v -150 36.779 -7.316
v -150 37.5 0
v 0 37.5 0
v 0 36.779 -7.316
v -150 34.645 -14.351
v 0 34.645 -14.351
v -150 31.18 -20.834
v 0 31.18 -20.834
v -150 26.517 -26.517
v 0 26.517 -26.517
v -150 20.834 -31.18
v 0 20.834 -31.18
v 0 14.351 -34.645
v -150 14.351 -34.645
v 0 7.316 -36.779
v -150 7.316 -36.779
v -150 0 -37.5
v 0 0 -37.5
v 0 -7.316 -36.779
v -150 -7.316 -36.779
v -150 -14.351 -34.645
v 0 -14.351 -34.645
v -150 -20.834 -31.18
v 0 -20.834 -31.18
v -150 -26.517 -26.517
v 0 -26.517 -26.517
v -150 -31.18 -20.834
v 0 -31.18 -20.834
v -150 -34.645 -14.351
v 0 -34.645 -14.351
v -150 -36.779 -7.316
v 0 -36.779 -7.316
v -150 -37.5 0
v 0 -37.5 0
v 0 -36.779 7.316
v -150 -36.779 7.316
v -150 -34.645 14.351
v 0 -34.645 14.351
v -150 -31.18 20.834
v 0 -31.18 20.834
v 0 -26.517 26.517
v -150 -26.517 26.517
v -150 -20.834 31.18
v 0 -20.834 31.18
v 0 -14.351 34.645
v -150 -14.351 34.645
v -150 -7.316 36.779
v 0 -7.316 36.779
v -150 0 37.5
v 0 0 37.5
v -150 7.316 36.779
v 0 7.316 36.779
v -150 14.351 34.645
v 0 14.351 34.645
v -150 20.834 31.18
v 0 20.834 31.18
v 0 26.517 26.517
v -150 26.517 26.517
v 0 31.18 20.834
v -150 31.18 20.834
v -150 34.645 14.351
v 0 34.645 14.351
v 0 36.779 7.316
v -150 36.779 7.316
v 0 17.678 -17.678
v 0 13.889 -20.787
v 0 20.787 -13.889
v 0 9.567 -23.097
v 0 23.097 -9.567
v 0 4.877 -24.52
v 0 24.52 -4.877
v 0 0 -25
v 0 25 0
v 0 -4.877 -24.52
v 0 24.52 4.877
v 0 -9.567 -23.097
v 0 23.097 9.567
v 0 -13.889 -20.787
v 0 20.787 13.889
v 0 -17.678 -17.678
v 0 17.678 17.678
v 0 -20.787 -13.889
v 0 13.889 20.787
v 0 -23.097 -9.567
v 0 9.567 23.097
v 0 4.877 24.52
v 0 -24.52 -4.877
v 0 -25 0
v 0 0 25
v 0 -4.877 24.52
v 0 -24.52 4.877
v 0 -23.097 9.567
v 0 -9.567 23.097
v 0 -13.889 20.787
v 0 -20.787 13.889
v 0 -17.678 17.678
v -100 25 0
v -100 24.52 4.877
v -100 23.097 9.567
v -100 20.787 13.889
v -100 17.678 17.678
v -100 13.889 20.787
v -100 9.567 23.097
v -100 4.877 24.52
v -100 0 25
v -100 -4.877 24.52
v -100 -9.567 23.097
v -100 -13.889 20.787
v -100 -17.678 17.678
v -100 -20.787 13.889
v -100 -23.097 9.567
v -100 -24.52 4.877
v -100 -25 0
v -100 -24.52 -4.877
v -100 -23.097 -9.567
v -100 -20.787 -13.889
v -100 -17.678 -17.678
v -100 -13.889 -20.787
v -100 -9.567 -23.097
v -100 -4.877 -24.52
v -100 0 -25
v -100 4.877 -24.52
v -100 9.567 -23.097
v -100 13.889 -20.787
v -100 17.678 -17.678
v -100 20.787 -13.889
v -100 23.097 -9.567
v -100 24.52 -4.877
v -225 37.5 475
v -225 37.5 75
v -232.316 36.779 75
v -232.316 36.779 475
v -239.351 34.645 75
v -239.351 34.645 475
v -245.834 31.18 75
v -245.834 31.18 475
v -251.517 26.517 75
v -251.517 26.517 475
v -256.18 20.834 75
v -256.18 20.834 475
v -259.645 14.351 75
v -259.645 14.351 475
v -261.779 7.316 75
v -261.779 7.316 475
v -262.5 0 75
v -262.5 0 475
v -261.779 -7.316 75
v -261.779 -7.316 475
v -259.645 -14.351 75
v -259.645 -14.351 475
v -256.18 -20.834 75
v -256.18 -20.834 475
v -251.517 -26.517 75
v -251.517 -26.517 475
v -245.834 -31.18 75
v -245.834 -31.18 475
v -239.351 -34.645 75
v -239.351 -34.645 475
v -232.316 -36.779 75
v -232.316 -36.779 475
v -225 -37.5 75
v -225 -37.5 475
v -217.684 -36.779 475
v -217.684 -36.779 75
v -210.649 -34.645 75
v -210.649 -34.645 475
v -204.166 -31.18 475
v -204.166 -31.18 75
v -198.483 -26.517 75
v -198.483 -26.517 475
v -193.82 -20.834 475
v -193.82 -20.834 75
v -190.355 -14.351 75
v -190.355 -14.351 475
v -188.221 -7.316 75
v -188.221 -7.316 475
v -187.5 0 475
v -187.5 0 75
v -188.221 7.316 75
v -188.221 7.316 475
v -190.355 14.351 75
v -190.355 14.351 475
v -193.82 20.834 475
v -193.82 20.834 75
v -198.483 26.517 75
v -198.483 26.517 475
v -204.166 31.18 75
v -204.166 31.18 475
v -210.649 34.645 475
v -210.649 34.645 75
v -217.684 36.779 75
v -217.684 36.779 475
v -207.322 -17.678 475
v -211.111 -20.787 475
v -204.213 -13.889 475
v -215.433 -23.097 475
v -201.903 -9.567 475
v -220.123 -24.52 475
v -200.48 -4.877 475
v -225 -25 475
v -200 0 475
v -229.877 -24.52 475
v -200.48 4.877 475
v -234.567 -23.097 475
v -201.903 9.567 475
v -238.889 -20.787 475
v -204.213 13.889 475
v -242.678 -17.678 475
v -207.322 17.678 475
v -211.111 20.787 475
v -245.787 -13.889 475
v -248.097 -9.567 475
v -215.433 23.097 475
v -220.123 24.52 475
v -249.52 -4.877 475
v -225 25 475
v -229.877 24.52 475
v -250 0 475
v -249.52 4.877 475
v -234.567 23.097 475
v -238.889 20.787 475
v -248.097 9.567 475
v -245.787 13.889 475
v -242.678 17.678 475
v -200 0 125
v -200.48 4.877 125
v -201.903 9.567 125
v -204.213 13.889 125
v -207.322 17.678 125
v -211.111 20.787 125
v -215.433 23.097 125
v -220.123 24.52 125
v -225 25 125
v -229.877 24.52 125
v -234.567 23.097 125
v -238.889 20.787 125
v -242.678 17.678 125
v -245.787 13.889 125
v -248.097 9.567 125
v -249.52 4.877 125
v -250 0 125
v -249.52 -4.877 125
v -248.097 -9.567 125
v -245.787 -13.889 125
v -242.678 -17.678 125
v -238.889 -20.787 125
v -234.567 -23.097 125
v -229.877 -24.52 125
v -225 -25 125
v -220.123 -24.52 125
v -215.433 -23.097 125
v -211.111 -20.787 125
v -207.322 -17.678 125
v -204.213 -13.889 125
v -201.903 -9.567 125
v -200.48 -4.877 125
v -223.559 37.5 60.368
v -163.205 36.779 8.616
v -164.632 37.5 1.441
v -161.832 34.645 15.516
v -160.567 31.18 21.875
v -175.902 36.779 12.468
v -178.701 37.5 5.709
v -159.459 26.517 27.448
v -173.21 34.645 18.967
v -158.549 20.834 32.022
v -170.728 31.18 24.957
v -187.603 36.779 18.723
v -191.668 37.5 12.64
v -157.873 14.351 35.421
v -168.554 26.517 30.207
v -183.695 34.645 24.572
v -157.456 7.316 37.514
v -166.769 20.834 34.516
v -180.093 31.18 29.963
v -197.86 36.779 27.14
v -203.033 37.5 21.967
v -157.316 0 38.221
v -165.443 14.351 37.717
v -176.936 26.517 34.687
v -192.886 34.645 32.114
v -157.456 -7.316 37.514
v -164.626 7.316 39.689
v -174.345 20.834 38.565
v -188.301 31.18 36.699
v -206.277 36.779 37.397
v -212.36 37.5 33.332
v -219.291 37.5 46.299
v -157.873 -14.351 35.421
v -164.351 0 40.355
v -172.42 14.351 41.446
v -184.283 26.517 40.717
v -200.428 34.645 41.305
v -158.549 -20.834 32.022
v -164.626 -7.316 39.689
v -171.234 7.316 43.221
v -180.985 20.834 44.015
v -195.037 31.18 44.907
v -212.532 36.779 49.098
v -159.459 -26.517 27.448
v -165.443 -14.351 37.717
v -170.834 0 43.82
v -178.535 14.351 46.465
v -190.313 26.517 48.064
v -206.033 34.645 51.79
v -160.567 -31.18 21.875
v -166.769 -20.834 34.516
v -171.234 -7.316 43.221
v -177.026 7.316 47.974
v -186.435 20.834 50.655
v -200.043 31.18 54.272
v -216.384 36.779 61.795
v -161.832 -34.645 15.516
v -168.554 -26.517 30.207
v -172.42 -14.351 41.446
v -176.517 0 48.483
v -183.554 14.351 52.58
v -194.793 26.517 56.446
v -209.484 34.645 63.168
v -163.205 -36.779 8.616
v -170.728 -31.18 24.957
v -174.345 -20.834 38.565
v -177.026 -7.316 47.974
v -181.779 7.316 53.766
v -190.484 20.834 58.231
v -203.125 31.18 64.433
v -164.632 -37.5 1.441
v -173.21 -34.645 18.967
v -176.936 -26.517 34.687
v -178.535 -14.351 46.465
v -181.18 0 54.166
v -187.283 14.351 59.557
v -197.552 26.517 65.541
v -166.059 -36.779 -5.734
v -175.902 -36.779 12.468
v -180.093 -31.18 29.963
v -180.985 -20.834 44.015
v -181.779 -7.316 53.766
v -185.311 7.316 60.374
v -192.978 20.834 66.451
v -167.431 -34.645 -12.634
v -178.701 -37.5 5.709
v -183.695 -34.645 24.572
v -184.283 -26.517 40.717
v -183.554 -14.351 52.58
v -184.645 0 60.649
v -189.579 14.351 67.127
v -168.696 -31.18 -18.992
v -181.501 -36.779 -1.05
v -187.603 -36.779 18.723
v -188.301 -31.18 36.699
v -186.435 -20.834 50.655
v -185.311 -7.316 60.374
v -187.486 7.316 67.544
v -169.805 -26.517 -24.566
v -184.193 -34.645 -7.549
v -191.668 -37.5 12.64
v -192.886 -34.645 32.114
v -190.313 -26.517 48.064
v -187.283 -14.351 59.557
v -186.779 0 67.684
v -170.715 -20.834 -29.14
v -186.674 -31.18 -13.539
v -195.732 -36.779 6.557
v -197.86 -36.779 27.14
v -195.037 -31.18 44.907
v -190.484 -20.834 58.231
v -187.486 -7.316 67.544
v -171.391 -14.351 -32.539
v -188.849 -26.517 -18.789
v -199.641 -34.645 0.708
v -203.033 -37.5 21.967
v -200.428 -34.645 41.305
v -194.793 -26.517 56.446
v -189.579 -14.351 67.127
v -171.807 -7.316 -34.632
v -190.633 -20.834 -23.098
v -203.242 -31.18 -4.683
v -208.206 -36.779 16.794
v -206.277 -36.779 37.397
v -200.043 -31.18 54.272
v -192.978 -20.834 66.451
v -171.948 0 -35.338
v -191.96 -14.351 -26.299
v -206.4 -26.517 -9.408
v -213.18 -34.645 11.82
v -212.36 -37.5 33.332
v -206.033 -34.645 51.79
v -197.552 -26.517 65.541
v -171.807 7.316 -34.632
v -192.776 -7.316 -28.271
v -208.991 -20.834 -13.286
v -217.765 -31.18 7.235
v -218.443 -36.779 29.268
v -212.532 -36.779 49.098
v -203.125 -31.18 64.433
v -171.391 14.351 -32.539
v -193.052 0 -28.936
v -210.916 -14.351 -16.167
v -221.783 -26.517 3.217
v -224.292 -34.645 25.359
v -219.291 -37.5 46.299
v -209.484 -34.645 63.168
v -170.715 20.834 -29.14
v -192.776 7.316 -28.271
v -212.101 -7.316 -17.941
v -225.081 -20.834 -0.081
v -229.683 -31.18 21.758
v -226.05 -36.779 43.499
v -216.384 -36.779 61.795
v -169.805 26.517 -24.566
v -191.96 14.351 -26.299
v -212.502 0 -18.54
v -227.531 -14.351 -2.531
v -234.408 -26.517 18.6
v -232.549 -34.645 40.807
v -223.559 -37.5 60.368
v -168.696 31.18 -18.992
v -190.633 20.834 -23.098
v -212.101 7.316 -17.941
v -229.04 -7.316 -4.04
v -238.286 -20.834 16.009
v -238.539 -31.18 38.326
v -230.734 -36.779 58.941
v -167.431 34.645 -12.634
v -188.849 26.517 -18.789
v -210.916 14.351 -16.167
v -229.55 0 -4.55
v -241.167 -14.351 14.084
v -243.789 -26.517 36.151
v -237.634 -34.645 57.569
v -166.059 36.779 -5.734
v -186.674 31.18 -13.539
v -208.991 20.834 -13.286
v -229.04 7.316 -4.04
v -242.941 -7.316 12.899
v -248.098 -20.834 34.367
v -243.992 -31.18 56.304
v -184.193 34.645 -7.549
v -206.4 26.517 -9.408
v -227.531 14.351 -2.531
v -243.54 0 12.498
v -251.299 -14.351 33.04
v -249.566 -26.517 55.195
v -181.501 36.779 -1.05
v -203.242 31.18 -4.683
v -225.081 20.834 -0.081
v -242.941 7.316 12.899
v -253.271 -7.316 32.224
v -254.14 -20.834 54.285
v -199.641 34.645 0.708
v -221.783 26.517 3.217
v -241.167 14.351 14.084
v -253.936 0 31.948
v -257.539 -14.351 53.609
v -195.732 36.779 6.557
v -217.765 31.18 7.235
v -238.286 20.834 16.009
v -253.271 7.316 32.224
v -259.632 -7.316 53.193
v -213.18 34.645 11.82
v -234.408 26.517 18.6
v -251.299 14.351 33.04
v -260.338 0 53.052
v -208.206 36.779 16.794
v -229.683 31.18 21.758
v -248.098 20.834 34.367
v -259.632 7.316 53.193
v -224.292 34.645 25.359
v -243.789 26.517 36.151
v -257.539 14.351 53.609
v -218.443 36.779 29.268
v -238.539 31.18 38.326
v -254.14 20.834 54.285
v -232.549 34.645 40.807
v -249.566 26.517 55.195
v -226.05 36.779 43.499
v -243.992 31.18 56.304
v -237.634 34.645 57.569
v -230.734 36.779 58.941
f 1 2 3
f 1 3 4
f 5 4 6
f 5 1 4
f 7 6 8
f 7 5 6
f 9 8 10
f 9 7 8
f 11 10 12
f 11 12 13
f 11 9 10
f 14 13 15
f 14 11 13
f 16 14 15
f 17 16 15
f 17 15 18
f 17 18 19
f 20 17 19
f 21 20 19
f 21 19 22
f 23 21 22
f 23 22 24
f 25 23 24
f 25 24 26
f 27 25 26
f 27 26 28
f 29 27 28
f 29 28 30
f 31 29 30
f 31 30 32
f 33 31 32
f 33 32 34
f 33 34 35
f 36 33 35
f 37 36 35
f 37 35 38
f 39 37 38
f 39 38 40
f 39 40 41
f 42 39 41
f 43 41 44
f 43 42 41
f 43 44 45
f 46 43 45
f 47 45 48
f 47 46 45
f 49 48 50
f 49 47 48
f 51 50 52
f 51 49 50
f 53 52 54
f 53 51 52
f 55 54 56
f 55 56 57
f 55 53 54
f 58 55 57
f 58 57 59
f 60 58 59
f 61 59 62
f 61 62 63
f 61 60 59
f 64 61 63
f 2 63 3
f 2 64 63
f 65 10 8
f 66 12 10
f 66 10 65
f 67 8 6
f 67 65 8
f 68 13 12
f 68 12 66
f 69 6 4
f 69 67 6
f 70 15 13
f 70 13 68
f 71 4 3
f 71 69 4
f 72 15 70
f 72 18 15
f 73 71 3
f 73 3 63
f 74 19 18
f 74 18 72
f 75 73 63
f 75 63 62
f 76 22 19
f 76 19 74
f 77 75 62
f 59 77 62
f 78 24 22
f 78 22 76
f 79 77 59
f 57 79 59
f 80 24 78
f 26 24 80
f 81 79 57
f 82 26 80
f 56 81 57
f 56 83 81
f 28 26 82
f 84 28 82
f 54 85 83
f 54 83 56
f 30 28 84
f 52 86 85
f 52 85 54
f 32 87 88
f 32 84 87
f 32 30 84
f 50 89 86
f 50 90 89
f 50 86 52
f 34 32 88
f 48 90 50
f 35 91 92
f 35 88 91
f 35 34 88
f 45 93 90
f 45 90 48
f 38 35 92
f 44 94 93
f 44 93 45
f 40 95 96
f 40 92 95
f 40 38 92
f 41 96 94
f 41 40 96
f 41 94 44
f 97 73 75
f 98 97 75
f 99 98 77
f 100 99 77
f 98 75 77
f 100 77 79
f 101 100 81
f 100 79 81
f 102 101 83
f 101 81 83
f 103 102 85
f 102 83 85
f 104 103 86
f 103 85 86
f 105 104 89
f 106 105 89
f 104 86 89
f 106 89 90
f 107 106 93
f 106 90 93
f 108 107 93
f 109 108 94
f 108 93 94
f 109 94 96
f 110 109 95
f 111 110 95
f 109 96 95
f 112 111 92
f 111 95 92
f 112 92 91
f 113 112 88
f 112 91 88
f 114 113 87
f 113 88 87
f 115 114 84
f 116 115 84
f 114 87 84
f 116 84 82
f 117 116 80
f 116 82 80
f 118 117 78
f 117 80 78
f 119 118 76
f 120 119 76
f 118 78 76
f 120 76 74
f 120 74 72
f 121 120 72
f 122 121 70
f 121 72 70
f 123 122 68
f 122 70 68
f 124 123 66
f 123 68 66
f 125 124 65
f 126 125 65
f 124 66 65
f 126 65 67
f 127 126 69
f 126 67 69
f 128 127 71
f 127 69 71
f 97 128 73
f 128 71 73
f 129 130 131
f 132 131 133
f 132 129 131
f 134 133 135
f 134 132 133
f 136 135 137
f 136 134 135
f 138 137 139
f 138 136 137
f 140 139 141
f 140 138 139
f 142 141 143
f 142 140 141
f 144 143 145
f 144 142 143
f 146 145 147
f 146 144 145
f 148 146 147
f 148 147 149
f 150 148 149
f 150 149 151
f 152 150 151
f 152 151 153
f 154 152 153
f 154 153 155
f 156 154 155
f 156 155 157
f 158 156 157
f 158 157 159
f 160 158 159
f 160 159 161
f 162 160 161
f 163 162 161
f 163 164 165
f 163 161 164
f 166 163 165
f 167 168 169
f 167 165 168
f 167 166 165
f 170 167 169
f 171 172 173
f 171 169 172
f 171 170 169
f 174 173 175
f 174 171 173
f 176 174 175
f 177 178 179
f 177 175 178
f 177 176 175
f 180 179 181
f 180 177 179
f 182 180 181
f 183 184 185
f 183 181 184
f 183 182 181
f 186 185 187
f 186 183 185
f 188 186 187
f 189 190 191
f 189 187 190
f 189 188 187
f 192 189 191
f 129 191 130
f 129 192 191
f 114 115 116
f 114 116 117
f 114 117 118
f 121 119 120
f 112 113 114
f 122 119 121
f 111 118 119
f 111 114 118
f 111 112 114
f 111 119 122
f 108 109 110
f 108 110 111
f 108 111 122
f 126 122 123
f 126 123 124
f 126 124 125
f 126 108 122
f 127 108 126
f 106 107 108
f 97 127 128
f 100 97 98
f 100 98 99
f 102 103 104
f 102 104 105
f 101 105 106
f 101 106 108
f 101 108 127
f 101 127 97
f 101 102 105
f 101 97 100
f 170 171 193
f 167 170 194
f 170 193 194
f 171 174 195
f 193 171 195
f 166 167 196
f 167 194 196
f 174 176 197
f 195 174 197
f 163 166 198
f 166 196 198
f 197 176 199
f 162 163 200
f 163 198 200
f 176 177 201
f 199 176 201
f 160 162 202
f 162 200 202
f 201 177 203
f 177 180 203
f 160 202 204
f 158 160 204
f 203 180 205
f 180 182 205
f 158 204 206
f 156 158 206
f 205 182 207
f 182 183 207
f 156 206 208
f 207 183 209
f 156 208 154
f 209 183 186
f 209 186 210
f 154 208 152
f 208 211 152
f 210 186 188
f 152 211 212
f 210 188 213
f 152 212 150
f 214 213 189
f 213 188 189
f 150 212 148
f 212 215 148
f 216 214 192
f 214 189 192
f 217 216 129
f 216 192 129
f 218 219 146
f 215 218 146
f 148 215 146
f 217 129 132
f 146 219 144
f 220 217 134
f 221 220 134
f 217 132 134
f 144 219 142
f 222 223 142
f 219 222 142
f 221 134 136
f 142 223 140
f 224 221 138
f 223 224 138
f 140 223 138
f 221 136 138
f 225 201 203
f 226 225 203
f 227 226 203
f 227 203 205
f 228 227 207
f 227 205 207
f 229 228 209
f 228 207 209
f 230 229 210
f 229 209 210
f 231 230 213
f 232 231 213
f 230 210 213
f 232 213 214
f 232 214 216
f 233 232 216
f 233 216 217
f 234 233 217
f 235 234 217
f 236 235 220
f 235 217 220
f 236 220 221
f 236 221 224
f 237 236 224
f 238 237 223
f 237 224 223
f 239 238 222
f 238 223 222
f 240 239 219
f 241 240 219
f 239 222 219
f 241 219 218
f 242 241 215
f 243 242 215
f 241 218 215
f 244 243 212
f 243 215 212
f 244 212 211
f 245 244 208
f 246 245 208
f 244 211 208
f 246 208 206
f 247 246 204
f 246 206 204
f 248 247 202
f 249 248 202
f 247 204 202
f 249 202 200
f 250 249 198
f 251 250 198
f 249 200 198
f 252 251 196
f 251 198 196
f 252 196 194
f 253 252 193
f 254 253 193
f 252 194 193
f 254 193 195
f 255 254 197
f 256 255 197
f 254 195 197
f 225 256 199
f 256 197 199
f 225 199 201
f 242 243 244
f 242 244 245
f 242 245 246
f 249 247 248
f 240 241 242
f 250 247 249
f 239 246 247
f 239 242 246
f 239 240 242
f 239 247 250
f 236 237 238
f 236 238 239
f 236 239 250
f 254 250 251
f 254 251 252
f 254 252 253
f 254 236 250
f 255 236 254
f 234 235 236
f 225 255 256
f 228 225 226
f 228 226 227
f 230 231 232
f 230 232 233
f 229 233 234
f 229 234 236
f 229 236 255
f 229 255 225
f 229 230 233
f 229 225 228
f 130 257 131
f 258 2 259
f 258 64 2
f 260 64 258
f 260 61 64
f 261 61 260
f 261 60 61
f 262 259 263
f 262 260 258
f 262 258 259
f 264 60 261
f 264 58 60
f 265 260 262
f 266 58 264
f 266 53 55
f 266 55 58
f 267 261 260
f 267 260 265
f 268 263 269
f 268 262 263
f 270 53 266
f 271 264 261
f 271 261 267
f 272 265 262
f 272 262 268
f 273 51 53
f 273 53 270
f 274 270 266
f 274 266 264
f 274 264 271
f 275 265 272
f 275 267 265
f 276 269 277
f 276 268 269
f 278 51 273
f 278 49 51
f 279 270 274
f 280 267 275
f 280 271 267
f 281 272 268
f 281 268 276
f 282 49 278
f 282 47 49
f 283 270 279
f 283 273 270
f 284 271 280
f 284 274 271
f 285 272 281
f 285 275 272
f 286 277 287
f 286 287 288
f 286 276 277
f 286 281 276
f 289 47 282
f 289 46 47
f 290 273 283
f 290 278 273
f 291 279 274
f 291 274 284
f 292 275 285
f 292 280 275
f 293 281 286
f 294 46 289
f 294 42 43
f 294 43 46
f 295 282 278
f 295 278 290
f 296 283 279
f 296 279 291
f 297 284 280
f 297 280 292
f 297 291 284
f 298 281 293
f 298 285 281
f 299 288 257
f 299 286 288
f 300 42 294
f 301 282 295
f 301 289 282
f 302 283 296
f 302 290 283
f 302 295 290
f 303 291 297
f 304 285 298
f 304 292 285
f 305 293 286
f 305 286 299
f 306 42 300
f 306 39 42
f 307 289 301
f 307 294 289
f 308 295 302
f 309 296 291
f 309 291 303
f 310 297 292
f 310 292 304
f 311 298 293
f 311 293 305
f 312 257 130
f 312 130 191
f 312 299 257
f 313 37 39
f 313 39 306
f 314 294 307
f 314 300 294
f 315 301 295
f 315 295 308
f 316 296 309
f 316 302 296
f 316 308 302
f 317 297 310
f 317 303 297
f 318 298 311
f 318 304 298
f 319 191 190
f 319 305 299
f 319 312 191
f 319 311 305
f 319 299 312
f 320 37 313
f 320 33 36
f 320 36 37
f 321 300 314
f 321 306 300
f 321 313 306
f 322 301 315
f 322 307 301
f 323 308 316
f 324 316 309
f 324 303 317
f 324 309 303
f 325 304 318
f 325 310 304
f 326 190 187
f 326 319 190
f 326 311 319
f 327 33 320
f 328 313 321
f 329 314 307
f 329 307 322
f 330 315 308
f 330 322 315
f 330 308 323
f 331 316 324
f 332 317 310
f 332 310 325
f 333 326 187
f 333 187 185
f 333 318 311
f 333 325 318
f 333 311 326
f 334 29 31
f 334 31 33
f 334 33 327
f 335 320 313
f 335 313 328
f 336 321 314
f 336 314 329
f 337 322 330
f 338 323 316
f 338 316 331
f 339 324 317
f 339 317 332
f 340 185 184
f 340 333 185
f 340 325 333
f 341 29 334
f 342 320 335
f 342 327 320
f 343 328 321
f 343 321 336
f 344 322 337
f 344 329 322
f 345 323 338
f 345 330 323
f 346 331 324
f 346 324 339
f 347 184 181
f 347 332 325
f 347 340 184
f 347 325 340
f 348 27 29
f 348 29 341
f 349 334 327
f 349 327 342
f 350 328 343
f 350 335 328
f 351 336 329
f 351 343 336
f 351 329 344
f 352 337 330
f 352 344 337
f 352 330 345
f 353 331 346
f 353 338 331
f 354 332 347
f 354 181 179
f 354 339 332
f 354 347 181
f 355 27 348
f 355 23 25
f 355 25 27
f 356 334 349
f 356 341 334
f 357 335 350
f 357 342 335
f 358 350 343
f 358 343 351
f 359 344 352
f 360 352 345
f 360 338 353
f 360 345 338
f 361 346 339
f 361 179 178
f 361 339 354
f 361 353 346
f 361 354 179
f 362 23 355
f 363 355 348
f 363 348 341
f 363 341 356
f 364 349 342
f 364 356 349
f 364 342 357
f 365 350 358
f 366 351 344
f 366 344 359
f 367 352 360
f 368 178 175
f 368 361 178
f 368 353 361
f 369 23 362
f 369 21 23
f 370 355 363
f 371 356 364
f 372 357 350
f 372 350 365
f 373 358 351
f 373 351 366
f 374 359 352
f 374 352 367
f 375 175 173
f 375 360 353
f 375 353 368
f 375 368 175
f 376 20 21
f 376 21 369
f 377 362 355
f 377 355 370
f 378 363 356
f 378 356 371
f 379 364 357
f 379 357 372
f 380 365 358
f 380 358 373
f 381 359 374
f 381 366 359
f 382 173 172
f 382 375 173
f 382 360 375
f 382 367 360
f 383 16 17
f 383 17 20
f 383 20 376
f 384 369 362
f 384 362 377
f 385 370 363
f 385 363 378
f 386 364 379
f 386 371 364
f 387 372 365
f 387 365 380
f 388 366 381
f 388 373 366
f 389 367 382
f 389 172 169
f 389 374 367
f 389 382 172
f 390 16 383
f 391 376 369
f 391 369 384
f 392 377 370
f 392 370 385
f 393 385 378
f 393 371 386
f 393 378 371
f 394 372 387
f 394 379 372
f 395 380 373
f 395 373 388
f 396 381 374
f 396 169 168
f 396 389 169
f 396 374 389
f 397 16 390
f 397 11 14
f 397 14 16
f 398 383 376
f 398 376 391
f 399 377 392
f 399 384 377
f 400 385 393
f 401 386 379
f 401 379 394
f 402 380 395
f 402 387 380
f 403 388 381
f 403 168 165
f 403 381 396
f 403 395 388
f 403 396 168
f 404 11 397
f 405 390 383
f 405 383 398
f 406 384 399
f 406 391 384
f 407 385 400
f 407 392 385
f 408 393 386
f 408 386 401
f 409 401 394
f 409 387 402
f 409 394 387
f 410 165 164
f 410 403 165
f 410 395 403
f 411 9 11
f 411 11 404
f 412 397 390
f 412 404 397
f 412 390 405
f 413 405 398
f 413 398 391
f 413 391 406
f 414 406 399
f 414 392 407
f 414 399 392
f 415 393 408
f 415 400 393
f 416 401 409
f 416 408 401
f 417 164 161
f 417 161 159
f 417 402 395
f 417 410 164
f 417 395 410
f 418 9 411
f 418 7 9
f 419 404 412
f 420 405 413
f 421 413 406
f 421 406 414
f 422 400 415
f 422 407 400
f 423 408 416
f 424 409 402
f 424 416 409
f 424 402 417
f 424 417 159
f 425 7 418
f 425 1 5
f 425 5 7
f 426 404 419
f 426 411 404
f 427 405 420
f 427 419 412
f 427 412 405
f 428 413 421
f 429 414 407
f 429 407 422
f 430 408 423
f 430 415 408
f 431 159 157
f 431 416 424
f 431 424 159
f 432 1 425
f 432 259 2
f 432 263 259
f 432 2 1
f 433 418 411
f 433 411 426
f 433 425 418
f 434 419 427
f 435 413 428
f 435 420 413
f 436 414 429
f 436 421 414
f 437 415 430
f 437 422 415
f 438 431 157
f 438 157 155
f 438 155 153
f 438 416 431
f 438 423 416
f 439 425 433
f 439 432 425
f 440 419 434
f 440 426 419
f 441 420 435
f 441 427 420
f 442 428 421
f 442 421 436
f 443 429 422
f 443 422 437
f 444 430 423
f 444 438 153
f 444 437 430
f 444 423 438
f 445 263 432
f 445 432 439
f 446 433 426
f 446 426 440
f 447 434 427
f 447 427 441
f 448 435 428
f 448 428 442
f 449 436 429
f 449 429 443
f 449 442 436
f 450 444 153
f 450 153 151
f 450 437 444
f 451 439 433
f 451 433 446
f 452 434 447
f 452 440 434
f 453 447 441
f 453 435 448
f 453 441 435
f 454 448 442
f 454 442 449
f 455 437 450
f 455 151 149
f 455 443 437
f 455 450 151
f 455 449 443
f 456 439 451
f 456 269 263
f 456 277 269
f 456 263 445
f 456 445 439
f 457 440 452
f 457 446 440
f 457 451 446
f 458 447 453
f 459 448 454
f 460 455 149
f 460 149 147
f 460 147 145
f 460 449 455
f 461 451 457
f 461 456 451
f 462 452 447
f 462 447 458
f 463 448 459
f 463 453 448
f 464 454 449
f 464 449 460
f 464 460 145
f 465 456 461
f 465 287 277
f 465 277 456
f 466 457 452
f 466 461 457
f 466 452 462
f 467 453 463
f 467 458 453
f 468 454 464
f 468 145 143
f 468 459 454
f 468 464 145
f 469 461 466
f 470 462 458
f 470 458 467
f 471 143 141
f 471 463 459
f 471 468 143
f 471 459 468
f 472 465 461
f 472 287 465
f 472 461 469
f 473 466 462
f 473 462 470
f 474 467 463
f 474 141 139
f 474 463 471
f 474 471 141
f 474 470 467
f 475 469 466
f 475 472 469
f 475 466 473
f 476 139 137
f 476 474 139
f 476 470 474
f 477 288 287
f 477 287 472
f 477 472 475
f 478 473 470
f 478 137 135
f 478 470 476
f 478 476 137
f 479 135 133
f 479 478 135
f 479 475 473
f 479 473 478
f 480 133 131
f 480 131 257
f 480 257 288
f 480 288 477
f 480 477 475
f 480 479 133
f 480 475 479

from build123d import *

# Parameters (mm, degrees)
F0_R     = 37.5
F3_R     = 25
F4_DEPTH = 350
F5_R     = 25
F6_DEPTH = 100


with BuildPart() as f2:
    # F2: sweep along a path in F1
    with BuildLine(Plane.XZ) as f2_path:
        Line((0, 0), (-150, 0))
        ThreePointArc((-150, 0), (-203.033008589, 21.966991411), (-225, 75))
        Line((-225, 75), (-225, 475))
    # F0 (on Right) → F2 (sweep)
    with BuildSketch(Plane.YZ):
        Circle(F0_R)
    sweep(path=f2_path.line)

    # F3 (on face) → F4 (cut)
    with BuildSketch(Plane.XY.offset(475)):
        with Locations((-225, 0)):
            Circle(F3_R)
    extrude(amount=-F4_DEPTH, mode=Mode.SUBTRACT)

    # F5 (on face) → F6 (cut)
    with BuildSketch(Plane.YZ):
        Circle(F5_R)
    extrude(amount=-F6_DEPTH, mode=Mode.SUBTRACT)


solid = f2.part
